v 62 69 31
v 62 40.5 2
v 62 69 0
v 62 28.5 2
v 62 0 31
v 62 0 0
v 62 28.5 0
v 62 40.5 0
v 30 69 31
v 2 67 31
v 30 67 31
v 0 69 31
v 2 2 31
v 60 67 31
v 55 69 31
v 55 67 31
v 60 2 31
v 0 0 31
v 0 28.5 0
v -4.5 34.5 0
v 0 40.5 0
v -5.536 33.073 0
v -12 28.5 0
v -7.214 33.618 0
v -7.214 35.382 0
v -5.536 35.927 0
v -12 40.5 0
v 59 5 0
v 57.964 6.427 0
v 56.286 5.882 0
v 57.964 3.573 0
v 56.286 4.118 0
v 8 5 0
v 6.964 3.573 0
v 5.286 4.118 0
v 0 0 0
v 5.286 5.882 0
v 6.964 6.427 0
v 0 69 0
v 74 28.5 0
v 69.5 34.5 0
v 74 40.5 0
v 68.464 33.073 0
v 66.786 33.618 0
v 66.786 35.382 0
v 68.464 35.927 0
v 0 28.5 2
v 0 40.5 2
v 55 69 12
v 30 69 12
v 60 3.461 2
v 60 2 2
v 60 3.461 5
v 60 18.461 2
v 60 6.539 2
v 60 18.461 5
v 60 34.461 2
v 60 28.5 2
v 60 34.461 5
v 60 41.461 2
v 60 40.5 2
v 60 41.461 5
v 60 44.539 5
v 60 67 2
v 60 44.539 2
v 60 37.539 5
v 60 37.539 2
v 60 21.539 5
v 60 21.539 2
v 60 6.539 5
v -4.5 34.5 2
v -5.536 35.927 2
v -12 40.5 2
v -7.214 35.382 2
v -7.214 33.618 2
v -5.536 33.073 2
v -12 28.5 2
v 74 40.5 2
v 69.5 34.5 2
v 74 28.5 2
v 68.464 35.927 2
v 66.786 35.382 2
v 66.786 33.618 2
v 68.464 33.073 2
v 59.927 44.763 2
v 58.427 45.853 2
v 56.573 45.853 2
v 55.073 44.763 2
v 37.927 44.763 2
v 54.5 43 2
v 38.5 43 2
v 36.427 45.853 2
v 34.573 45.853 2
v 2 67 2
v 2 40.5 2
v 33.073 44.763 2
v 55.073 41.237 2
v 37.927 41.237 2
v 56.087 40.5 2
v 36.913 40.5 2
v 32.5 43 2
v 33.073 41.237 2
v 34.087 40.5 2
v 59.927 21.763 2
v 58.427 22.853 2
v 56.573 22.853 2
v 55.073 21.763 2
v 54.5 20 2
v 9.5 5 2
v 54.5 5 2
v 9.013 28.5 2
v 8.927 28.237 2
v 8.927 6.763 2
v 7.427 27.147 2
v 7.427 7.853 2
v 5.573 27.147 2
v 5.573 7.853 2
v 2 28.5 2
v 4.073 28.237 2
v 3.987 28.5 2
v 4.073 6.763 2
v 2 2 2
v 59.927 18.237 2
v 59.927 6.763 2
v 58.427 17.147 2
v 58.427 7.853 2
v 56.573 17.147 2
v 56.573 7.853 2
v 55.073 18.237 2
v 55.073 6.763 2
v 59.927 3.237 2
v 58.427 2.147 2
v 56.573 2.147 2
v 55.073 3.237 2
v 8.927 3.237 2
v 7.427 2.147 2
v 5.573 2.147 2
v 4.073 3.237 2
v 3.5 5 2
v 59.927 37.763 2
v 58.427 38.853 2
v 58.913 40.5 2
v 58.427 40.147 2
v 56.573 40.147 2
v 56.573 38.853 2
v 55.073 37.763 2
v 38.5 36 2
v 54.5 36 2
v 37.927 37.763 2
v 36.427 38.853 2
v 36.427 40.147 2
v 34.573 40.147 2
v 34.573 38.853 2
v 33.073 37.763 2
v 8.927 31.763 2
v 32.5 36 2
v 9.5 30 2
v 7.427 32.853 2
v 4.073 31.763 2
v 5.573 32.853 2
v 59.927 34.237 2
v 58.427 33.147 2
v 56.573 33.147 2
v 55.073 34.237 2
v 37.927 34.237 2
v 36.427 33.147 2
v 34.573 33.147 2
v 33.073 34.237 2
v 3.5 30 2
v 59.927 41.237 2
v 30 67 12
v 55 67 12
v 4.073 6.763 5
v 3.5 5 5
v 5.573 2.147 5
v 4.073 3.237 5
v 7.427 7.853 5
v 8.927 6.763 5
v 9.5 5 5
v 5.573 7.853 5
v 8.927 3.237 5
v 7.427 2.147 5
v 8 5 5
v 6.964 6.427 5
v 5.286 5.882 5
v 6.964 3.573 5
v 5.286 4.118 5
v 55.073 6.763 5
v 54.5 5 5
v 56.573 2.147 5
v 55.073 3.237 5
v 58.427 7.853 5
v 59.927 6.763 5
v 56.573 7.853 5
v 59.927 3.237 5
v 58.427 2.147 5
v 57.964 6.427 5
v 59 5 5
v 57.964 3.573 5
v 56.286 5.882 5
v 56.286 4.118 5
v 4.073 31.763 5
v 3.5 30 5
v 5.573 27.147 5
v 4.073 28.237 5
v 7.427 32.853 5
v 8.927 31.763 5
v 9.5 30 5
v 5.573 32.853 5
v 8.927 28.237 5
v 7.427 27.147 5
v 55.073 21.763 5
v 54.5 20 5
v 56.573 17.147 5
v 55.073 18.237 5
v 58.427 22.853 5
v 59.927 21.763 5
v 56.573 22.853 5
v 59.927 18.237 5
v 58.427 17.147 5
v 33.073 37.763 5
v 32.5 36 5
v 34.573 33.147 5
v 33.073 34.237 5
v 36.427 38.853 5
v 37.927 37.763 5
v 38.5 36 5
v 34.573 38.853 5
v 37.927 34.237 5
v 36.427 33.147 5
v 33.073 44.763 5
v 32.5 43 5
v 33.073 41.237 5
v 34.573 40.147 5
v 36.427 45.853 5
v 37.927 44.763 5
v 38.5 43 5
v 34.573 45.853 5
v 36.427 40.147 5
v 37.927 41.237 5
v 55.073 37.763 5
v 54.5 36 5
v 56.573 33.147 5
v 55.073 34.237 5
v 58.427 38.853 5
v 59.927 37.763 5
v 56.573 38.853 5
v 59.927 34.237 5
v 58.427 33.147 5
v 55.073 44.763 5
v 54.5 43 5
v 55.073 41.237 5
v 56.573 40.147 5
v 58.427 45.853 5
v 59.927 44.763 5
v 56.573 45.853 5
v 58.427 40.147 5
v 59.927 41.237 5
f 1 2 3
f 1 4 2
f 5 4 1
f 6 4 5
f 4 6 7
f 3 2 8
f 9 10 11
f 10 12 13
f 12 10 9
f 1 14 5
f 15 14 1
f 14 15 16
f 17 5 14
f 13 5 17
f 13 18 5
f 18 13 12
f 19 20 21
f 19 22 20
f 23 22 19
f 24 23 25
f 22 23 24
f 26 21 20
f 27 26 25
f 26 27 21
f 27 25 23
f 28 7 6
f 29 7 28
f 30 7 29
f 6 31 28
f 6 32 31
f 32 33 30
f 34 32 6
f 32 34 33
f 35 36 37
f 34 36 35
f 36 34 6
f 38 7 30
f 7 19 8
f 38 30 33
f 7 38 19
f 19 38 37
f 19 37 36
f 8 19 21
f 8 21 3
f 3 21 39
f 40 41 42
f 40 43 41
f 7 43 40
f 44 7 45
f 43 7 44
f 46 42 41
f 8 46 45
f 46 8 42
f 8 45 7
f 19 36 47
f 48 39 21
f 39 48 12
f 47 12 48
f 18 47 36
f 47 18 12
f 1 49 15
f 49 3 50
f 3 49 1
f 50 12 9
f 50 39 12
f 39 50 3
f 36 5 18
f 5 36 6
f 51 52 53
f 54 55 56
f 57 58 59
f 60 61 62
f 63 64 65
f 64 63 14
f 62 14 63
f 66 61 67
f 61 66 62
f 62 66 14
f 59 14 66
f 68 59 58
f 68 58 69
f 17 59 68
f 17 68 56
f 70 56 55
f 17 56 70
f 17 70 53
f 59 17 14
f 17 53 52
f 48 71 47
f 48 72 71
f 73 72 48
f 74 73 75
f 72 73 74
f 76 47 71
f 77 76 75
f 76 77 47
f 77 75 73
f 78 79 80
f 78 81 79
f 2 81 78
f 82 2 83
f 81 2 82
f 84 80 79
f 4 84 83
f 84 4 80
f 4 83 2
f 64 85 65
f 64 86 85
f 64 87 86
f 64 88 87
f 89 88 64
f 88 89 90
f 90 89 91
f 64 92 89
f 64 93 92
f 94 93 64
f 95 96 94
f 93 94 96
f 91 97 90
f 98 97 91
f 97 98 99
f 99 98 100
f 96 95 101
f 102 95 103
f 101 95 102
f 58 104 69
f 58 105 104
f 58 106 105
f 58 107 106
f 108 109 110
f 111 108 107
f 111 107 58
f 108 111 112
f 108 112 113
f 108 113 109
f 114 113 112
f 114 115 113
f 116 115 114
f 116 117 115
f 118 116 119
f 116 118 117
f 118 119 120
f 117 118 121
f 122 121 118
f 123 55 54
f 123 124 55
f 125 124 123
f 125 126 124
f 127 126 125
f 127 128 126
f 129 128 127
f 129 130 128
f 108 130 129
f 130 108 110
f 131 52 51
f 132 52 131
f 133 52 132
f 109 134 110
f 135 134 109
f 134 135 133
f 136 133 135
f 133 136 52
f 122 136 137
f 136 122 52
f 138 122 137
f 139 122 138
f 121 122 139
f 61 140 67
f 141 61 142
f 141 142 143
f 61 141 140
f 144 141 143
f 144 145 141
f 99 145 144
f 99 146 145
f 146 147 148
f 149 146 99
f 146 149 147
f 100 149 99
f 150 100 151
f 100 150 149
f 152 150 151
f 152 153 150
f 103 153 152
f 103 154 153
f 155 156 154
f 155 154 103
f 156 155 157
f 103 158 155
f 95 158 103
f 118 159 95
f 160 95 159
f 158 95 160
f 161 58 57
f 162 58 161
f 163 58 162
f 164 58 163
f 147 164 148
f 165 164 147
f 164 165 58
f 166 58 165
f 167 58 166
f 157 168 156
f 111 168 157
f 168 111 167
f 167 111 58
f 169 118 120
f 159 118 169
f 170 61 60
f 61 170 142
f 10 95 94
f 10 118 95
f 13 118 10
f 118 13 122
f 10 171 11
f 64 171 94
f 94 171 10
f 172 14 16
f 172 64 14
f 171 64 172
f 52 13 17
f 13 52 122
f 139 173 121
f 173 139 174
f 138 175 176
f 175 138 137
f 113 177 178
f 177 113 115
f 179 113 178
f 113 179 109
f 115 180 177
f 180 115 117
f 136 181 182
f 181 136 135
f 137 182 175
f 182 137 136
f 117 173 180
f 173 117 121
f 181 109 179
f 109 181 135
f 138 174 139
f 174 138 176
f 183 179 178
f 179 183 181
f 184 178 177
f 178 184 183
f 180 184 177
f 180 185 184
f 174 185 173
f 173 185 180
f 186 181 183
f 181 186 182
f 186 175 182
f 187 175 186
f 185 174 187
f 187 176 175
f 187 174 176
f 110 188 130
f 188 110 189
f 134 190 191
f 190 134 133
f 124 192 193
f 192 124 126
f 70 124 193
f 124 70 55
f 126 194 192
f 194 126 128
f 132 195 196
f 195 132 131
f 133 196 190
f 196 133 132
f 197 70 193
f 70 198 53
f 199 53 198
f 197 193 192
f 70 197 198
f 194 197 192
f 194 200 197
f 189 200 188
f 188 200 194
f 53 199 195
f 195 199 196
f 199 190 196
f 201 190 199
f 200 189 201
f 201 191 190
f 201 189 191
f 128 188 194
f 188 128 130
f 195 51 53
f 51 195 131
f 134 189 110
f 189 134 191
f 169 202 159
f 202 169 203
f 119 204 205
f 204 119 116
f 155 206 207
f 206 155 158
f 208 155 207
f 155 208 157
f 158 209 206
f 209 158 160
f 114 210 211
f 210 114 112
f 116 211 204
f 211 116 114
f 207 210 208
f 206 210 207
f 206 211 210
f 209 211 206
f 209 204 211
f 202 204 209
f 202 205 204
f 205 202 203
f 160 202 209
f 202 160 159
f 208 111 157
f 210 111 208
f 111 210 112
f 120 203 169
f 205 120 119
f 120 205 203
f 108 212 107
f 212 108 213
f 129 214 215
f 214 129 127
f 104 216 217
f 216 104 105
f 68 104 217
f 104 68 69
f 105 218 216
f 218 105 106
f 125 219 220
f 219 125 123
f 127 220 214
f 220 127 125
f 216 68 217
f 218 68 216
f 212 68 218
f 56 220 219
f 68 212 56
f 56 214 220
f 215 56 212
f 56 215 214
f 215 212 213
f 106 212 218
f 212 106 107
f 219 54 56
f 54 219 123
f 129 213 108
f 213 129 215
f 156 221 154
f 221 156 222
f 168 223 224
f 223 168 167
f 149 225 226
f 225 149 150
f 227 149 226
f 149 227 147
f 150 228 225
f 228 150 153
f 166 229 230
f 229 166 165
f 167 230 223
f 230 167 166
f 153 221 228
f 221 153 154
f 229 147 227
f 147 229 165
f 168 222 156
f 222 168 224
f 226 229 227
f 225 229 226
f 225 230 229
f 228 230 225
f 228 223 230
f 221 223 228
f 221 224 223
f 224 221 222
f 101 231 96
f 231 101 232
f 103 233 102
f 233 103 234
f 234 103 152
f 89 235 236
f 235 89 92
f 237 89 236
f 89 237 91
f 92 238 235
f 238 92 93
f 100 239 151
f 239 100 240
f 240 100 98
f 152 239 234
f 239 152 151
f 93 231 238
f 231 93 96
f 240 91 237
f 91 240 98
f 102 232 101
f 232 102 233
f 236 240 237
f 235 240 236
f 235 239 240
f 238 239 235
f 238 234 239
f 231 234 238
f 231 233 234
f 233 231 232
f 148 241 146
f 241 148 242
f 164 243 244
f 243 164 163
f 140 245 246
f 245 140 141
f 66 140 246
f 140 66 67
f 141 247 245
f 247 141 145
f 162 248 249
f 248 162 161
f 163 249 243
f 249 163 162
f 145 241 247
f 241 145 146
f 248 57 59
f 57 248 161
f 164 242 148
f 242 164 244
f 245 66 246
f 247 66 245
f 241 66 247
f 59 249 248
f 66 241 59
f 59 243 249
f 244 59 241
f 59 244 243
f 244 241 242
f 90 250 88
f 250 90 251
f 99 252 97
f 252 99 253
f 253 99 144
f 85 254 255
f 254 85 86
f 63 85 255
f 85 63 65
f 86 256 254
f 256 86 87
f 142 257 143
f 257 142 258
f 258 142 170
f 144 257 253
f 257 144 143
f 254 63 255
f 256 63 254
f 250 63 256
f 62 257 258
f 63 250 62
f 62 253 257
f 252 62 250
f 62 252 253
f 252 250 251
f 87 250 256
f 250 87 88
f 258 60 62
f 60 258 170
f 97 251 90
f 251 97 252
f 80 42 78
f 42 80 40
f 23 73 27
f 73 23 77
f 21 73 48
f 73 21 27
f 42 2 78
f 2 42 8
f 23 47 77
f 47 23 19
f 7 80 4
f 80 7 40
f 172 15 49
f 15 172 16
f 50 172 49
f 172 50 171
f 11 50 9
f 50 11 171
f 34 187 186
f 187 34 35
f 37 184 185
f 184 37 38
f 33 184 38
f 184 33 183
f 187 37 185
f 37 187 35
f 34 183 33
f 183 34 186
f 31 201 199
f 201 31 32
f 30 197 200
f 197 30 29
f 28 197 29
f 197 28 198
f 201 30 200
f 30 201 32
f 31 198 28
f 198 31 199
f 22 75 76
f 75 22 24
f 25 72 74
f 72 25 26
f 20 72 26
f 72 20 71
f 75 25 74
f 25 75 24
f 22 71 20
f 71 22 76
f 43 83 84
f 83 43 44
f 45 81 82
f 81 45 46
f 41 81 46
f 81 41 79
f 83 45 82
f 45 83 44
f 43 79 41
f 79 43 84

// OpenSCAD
l=58;
w=65;
bh=26;
sd =51;
d=5;
h=5;

box = [l+4,w+4,bh+5];
ibox = box - [4,4,-20];

scrw = [
    [(l+6-sd)/2,d],
    [(l+6-sd)/2+sd,d],
    [(l+6-sd)/2,d+25],
    [(l+6-sd)/2+sd,d+15],
    [(l+6-sd)/2+l/2,d+31],
    [(l+6-sd)/2+l/2,d+38],
    [(l+6-sd)/2+sd,d+31],
    [(l+6-sd)/2+sd,d+38],
    ];

difference(){
    union(){
    difference(){
        cube(box);
            translate([2,2,2])cube(ibox);
    };
     for (i = scrw){
        translate(i) cylinder(r=3,h=h);
        };
    translate([-12,box[1]/2-6,0])cube([box[0]+24,12,2]);   
    }

    translate([30,60,12])cube([25,10,40]);
    translate(scrw[0])cylinder(r=1.5,h=20,center=true);
    translate(scrw[1])cylinder(r=1.5,h=20,center=true);
    translate([-6,box[1]/2,0])cylinder(r=1.5,h=20,center=true);
    translate([6+box[0],box[1]/2,0])cylinder(r=1.5,h=20,center=true);
    
}
